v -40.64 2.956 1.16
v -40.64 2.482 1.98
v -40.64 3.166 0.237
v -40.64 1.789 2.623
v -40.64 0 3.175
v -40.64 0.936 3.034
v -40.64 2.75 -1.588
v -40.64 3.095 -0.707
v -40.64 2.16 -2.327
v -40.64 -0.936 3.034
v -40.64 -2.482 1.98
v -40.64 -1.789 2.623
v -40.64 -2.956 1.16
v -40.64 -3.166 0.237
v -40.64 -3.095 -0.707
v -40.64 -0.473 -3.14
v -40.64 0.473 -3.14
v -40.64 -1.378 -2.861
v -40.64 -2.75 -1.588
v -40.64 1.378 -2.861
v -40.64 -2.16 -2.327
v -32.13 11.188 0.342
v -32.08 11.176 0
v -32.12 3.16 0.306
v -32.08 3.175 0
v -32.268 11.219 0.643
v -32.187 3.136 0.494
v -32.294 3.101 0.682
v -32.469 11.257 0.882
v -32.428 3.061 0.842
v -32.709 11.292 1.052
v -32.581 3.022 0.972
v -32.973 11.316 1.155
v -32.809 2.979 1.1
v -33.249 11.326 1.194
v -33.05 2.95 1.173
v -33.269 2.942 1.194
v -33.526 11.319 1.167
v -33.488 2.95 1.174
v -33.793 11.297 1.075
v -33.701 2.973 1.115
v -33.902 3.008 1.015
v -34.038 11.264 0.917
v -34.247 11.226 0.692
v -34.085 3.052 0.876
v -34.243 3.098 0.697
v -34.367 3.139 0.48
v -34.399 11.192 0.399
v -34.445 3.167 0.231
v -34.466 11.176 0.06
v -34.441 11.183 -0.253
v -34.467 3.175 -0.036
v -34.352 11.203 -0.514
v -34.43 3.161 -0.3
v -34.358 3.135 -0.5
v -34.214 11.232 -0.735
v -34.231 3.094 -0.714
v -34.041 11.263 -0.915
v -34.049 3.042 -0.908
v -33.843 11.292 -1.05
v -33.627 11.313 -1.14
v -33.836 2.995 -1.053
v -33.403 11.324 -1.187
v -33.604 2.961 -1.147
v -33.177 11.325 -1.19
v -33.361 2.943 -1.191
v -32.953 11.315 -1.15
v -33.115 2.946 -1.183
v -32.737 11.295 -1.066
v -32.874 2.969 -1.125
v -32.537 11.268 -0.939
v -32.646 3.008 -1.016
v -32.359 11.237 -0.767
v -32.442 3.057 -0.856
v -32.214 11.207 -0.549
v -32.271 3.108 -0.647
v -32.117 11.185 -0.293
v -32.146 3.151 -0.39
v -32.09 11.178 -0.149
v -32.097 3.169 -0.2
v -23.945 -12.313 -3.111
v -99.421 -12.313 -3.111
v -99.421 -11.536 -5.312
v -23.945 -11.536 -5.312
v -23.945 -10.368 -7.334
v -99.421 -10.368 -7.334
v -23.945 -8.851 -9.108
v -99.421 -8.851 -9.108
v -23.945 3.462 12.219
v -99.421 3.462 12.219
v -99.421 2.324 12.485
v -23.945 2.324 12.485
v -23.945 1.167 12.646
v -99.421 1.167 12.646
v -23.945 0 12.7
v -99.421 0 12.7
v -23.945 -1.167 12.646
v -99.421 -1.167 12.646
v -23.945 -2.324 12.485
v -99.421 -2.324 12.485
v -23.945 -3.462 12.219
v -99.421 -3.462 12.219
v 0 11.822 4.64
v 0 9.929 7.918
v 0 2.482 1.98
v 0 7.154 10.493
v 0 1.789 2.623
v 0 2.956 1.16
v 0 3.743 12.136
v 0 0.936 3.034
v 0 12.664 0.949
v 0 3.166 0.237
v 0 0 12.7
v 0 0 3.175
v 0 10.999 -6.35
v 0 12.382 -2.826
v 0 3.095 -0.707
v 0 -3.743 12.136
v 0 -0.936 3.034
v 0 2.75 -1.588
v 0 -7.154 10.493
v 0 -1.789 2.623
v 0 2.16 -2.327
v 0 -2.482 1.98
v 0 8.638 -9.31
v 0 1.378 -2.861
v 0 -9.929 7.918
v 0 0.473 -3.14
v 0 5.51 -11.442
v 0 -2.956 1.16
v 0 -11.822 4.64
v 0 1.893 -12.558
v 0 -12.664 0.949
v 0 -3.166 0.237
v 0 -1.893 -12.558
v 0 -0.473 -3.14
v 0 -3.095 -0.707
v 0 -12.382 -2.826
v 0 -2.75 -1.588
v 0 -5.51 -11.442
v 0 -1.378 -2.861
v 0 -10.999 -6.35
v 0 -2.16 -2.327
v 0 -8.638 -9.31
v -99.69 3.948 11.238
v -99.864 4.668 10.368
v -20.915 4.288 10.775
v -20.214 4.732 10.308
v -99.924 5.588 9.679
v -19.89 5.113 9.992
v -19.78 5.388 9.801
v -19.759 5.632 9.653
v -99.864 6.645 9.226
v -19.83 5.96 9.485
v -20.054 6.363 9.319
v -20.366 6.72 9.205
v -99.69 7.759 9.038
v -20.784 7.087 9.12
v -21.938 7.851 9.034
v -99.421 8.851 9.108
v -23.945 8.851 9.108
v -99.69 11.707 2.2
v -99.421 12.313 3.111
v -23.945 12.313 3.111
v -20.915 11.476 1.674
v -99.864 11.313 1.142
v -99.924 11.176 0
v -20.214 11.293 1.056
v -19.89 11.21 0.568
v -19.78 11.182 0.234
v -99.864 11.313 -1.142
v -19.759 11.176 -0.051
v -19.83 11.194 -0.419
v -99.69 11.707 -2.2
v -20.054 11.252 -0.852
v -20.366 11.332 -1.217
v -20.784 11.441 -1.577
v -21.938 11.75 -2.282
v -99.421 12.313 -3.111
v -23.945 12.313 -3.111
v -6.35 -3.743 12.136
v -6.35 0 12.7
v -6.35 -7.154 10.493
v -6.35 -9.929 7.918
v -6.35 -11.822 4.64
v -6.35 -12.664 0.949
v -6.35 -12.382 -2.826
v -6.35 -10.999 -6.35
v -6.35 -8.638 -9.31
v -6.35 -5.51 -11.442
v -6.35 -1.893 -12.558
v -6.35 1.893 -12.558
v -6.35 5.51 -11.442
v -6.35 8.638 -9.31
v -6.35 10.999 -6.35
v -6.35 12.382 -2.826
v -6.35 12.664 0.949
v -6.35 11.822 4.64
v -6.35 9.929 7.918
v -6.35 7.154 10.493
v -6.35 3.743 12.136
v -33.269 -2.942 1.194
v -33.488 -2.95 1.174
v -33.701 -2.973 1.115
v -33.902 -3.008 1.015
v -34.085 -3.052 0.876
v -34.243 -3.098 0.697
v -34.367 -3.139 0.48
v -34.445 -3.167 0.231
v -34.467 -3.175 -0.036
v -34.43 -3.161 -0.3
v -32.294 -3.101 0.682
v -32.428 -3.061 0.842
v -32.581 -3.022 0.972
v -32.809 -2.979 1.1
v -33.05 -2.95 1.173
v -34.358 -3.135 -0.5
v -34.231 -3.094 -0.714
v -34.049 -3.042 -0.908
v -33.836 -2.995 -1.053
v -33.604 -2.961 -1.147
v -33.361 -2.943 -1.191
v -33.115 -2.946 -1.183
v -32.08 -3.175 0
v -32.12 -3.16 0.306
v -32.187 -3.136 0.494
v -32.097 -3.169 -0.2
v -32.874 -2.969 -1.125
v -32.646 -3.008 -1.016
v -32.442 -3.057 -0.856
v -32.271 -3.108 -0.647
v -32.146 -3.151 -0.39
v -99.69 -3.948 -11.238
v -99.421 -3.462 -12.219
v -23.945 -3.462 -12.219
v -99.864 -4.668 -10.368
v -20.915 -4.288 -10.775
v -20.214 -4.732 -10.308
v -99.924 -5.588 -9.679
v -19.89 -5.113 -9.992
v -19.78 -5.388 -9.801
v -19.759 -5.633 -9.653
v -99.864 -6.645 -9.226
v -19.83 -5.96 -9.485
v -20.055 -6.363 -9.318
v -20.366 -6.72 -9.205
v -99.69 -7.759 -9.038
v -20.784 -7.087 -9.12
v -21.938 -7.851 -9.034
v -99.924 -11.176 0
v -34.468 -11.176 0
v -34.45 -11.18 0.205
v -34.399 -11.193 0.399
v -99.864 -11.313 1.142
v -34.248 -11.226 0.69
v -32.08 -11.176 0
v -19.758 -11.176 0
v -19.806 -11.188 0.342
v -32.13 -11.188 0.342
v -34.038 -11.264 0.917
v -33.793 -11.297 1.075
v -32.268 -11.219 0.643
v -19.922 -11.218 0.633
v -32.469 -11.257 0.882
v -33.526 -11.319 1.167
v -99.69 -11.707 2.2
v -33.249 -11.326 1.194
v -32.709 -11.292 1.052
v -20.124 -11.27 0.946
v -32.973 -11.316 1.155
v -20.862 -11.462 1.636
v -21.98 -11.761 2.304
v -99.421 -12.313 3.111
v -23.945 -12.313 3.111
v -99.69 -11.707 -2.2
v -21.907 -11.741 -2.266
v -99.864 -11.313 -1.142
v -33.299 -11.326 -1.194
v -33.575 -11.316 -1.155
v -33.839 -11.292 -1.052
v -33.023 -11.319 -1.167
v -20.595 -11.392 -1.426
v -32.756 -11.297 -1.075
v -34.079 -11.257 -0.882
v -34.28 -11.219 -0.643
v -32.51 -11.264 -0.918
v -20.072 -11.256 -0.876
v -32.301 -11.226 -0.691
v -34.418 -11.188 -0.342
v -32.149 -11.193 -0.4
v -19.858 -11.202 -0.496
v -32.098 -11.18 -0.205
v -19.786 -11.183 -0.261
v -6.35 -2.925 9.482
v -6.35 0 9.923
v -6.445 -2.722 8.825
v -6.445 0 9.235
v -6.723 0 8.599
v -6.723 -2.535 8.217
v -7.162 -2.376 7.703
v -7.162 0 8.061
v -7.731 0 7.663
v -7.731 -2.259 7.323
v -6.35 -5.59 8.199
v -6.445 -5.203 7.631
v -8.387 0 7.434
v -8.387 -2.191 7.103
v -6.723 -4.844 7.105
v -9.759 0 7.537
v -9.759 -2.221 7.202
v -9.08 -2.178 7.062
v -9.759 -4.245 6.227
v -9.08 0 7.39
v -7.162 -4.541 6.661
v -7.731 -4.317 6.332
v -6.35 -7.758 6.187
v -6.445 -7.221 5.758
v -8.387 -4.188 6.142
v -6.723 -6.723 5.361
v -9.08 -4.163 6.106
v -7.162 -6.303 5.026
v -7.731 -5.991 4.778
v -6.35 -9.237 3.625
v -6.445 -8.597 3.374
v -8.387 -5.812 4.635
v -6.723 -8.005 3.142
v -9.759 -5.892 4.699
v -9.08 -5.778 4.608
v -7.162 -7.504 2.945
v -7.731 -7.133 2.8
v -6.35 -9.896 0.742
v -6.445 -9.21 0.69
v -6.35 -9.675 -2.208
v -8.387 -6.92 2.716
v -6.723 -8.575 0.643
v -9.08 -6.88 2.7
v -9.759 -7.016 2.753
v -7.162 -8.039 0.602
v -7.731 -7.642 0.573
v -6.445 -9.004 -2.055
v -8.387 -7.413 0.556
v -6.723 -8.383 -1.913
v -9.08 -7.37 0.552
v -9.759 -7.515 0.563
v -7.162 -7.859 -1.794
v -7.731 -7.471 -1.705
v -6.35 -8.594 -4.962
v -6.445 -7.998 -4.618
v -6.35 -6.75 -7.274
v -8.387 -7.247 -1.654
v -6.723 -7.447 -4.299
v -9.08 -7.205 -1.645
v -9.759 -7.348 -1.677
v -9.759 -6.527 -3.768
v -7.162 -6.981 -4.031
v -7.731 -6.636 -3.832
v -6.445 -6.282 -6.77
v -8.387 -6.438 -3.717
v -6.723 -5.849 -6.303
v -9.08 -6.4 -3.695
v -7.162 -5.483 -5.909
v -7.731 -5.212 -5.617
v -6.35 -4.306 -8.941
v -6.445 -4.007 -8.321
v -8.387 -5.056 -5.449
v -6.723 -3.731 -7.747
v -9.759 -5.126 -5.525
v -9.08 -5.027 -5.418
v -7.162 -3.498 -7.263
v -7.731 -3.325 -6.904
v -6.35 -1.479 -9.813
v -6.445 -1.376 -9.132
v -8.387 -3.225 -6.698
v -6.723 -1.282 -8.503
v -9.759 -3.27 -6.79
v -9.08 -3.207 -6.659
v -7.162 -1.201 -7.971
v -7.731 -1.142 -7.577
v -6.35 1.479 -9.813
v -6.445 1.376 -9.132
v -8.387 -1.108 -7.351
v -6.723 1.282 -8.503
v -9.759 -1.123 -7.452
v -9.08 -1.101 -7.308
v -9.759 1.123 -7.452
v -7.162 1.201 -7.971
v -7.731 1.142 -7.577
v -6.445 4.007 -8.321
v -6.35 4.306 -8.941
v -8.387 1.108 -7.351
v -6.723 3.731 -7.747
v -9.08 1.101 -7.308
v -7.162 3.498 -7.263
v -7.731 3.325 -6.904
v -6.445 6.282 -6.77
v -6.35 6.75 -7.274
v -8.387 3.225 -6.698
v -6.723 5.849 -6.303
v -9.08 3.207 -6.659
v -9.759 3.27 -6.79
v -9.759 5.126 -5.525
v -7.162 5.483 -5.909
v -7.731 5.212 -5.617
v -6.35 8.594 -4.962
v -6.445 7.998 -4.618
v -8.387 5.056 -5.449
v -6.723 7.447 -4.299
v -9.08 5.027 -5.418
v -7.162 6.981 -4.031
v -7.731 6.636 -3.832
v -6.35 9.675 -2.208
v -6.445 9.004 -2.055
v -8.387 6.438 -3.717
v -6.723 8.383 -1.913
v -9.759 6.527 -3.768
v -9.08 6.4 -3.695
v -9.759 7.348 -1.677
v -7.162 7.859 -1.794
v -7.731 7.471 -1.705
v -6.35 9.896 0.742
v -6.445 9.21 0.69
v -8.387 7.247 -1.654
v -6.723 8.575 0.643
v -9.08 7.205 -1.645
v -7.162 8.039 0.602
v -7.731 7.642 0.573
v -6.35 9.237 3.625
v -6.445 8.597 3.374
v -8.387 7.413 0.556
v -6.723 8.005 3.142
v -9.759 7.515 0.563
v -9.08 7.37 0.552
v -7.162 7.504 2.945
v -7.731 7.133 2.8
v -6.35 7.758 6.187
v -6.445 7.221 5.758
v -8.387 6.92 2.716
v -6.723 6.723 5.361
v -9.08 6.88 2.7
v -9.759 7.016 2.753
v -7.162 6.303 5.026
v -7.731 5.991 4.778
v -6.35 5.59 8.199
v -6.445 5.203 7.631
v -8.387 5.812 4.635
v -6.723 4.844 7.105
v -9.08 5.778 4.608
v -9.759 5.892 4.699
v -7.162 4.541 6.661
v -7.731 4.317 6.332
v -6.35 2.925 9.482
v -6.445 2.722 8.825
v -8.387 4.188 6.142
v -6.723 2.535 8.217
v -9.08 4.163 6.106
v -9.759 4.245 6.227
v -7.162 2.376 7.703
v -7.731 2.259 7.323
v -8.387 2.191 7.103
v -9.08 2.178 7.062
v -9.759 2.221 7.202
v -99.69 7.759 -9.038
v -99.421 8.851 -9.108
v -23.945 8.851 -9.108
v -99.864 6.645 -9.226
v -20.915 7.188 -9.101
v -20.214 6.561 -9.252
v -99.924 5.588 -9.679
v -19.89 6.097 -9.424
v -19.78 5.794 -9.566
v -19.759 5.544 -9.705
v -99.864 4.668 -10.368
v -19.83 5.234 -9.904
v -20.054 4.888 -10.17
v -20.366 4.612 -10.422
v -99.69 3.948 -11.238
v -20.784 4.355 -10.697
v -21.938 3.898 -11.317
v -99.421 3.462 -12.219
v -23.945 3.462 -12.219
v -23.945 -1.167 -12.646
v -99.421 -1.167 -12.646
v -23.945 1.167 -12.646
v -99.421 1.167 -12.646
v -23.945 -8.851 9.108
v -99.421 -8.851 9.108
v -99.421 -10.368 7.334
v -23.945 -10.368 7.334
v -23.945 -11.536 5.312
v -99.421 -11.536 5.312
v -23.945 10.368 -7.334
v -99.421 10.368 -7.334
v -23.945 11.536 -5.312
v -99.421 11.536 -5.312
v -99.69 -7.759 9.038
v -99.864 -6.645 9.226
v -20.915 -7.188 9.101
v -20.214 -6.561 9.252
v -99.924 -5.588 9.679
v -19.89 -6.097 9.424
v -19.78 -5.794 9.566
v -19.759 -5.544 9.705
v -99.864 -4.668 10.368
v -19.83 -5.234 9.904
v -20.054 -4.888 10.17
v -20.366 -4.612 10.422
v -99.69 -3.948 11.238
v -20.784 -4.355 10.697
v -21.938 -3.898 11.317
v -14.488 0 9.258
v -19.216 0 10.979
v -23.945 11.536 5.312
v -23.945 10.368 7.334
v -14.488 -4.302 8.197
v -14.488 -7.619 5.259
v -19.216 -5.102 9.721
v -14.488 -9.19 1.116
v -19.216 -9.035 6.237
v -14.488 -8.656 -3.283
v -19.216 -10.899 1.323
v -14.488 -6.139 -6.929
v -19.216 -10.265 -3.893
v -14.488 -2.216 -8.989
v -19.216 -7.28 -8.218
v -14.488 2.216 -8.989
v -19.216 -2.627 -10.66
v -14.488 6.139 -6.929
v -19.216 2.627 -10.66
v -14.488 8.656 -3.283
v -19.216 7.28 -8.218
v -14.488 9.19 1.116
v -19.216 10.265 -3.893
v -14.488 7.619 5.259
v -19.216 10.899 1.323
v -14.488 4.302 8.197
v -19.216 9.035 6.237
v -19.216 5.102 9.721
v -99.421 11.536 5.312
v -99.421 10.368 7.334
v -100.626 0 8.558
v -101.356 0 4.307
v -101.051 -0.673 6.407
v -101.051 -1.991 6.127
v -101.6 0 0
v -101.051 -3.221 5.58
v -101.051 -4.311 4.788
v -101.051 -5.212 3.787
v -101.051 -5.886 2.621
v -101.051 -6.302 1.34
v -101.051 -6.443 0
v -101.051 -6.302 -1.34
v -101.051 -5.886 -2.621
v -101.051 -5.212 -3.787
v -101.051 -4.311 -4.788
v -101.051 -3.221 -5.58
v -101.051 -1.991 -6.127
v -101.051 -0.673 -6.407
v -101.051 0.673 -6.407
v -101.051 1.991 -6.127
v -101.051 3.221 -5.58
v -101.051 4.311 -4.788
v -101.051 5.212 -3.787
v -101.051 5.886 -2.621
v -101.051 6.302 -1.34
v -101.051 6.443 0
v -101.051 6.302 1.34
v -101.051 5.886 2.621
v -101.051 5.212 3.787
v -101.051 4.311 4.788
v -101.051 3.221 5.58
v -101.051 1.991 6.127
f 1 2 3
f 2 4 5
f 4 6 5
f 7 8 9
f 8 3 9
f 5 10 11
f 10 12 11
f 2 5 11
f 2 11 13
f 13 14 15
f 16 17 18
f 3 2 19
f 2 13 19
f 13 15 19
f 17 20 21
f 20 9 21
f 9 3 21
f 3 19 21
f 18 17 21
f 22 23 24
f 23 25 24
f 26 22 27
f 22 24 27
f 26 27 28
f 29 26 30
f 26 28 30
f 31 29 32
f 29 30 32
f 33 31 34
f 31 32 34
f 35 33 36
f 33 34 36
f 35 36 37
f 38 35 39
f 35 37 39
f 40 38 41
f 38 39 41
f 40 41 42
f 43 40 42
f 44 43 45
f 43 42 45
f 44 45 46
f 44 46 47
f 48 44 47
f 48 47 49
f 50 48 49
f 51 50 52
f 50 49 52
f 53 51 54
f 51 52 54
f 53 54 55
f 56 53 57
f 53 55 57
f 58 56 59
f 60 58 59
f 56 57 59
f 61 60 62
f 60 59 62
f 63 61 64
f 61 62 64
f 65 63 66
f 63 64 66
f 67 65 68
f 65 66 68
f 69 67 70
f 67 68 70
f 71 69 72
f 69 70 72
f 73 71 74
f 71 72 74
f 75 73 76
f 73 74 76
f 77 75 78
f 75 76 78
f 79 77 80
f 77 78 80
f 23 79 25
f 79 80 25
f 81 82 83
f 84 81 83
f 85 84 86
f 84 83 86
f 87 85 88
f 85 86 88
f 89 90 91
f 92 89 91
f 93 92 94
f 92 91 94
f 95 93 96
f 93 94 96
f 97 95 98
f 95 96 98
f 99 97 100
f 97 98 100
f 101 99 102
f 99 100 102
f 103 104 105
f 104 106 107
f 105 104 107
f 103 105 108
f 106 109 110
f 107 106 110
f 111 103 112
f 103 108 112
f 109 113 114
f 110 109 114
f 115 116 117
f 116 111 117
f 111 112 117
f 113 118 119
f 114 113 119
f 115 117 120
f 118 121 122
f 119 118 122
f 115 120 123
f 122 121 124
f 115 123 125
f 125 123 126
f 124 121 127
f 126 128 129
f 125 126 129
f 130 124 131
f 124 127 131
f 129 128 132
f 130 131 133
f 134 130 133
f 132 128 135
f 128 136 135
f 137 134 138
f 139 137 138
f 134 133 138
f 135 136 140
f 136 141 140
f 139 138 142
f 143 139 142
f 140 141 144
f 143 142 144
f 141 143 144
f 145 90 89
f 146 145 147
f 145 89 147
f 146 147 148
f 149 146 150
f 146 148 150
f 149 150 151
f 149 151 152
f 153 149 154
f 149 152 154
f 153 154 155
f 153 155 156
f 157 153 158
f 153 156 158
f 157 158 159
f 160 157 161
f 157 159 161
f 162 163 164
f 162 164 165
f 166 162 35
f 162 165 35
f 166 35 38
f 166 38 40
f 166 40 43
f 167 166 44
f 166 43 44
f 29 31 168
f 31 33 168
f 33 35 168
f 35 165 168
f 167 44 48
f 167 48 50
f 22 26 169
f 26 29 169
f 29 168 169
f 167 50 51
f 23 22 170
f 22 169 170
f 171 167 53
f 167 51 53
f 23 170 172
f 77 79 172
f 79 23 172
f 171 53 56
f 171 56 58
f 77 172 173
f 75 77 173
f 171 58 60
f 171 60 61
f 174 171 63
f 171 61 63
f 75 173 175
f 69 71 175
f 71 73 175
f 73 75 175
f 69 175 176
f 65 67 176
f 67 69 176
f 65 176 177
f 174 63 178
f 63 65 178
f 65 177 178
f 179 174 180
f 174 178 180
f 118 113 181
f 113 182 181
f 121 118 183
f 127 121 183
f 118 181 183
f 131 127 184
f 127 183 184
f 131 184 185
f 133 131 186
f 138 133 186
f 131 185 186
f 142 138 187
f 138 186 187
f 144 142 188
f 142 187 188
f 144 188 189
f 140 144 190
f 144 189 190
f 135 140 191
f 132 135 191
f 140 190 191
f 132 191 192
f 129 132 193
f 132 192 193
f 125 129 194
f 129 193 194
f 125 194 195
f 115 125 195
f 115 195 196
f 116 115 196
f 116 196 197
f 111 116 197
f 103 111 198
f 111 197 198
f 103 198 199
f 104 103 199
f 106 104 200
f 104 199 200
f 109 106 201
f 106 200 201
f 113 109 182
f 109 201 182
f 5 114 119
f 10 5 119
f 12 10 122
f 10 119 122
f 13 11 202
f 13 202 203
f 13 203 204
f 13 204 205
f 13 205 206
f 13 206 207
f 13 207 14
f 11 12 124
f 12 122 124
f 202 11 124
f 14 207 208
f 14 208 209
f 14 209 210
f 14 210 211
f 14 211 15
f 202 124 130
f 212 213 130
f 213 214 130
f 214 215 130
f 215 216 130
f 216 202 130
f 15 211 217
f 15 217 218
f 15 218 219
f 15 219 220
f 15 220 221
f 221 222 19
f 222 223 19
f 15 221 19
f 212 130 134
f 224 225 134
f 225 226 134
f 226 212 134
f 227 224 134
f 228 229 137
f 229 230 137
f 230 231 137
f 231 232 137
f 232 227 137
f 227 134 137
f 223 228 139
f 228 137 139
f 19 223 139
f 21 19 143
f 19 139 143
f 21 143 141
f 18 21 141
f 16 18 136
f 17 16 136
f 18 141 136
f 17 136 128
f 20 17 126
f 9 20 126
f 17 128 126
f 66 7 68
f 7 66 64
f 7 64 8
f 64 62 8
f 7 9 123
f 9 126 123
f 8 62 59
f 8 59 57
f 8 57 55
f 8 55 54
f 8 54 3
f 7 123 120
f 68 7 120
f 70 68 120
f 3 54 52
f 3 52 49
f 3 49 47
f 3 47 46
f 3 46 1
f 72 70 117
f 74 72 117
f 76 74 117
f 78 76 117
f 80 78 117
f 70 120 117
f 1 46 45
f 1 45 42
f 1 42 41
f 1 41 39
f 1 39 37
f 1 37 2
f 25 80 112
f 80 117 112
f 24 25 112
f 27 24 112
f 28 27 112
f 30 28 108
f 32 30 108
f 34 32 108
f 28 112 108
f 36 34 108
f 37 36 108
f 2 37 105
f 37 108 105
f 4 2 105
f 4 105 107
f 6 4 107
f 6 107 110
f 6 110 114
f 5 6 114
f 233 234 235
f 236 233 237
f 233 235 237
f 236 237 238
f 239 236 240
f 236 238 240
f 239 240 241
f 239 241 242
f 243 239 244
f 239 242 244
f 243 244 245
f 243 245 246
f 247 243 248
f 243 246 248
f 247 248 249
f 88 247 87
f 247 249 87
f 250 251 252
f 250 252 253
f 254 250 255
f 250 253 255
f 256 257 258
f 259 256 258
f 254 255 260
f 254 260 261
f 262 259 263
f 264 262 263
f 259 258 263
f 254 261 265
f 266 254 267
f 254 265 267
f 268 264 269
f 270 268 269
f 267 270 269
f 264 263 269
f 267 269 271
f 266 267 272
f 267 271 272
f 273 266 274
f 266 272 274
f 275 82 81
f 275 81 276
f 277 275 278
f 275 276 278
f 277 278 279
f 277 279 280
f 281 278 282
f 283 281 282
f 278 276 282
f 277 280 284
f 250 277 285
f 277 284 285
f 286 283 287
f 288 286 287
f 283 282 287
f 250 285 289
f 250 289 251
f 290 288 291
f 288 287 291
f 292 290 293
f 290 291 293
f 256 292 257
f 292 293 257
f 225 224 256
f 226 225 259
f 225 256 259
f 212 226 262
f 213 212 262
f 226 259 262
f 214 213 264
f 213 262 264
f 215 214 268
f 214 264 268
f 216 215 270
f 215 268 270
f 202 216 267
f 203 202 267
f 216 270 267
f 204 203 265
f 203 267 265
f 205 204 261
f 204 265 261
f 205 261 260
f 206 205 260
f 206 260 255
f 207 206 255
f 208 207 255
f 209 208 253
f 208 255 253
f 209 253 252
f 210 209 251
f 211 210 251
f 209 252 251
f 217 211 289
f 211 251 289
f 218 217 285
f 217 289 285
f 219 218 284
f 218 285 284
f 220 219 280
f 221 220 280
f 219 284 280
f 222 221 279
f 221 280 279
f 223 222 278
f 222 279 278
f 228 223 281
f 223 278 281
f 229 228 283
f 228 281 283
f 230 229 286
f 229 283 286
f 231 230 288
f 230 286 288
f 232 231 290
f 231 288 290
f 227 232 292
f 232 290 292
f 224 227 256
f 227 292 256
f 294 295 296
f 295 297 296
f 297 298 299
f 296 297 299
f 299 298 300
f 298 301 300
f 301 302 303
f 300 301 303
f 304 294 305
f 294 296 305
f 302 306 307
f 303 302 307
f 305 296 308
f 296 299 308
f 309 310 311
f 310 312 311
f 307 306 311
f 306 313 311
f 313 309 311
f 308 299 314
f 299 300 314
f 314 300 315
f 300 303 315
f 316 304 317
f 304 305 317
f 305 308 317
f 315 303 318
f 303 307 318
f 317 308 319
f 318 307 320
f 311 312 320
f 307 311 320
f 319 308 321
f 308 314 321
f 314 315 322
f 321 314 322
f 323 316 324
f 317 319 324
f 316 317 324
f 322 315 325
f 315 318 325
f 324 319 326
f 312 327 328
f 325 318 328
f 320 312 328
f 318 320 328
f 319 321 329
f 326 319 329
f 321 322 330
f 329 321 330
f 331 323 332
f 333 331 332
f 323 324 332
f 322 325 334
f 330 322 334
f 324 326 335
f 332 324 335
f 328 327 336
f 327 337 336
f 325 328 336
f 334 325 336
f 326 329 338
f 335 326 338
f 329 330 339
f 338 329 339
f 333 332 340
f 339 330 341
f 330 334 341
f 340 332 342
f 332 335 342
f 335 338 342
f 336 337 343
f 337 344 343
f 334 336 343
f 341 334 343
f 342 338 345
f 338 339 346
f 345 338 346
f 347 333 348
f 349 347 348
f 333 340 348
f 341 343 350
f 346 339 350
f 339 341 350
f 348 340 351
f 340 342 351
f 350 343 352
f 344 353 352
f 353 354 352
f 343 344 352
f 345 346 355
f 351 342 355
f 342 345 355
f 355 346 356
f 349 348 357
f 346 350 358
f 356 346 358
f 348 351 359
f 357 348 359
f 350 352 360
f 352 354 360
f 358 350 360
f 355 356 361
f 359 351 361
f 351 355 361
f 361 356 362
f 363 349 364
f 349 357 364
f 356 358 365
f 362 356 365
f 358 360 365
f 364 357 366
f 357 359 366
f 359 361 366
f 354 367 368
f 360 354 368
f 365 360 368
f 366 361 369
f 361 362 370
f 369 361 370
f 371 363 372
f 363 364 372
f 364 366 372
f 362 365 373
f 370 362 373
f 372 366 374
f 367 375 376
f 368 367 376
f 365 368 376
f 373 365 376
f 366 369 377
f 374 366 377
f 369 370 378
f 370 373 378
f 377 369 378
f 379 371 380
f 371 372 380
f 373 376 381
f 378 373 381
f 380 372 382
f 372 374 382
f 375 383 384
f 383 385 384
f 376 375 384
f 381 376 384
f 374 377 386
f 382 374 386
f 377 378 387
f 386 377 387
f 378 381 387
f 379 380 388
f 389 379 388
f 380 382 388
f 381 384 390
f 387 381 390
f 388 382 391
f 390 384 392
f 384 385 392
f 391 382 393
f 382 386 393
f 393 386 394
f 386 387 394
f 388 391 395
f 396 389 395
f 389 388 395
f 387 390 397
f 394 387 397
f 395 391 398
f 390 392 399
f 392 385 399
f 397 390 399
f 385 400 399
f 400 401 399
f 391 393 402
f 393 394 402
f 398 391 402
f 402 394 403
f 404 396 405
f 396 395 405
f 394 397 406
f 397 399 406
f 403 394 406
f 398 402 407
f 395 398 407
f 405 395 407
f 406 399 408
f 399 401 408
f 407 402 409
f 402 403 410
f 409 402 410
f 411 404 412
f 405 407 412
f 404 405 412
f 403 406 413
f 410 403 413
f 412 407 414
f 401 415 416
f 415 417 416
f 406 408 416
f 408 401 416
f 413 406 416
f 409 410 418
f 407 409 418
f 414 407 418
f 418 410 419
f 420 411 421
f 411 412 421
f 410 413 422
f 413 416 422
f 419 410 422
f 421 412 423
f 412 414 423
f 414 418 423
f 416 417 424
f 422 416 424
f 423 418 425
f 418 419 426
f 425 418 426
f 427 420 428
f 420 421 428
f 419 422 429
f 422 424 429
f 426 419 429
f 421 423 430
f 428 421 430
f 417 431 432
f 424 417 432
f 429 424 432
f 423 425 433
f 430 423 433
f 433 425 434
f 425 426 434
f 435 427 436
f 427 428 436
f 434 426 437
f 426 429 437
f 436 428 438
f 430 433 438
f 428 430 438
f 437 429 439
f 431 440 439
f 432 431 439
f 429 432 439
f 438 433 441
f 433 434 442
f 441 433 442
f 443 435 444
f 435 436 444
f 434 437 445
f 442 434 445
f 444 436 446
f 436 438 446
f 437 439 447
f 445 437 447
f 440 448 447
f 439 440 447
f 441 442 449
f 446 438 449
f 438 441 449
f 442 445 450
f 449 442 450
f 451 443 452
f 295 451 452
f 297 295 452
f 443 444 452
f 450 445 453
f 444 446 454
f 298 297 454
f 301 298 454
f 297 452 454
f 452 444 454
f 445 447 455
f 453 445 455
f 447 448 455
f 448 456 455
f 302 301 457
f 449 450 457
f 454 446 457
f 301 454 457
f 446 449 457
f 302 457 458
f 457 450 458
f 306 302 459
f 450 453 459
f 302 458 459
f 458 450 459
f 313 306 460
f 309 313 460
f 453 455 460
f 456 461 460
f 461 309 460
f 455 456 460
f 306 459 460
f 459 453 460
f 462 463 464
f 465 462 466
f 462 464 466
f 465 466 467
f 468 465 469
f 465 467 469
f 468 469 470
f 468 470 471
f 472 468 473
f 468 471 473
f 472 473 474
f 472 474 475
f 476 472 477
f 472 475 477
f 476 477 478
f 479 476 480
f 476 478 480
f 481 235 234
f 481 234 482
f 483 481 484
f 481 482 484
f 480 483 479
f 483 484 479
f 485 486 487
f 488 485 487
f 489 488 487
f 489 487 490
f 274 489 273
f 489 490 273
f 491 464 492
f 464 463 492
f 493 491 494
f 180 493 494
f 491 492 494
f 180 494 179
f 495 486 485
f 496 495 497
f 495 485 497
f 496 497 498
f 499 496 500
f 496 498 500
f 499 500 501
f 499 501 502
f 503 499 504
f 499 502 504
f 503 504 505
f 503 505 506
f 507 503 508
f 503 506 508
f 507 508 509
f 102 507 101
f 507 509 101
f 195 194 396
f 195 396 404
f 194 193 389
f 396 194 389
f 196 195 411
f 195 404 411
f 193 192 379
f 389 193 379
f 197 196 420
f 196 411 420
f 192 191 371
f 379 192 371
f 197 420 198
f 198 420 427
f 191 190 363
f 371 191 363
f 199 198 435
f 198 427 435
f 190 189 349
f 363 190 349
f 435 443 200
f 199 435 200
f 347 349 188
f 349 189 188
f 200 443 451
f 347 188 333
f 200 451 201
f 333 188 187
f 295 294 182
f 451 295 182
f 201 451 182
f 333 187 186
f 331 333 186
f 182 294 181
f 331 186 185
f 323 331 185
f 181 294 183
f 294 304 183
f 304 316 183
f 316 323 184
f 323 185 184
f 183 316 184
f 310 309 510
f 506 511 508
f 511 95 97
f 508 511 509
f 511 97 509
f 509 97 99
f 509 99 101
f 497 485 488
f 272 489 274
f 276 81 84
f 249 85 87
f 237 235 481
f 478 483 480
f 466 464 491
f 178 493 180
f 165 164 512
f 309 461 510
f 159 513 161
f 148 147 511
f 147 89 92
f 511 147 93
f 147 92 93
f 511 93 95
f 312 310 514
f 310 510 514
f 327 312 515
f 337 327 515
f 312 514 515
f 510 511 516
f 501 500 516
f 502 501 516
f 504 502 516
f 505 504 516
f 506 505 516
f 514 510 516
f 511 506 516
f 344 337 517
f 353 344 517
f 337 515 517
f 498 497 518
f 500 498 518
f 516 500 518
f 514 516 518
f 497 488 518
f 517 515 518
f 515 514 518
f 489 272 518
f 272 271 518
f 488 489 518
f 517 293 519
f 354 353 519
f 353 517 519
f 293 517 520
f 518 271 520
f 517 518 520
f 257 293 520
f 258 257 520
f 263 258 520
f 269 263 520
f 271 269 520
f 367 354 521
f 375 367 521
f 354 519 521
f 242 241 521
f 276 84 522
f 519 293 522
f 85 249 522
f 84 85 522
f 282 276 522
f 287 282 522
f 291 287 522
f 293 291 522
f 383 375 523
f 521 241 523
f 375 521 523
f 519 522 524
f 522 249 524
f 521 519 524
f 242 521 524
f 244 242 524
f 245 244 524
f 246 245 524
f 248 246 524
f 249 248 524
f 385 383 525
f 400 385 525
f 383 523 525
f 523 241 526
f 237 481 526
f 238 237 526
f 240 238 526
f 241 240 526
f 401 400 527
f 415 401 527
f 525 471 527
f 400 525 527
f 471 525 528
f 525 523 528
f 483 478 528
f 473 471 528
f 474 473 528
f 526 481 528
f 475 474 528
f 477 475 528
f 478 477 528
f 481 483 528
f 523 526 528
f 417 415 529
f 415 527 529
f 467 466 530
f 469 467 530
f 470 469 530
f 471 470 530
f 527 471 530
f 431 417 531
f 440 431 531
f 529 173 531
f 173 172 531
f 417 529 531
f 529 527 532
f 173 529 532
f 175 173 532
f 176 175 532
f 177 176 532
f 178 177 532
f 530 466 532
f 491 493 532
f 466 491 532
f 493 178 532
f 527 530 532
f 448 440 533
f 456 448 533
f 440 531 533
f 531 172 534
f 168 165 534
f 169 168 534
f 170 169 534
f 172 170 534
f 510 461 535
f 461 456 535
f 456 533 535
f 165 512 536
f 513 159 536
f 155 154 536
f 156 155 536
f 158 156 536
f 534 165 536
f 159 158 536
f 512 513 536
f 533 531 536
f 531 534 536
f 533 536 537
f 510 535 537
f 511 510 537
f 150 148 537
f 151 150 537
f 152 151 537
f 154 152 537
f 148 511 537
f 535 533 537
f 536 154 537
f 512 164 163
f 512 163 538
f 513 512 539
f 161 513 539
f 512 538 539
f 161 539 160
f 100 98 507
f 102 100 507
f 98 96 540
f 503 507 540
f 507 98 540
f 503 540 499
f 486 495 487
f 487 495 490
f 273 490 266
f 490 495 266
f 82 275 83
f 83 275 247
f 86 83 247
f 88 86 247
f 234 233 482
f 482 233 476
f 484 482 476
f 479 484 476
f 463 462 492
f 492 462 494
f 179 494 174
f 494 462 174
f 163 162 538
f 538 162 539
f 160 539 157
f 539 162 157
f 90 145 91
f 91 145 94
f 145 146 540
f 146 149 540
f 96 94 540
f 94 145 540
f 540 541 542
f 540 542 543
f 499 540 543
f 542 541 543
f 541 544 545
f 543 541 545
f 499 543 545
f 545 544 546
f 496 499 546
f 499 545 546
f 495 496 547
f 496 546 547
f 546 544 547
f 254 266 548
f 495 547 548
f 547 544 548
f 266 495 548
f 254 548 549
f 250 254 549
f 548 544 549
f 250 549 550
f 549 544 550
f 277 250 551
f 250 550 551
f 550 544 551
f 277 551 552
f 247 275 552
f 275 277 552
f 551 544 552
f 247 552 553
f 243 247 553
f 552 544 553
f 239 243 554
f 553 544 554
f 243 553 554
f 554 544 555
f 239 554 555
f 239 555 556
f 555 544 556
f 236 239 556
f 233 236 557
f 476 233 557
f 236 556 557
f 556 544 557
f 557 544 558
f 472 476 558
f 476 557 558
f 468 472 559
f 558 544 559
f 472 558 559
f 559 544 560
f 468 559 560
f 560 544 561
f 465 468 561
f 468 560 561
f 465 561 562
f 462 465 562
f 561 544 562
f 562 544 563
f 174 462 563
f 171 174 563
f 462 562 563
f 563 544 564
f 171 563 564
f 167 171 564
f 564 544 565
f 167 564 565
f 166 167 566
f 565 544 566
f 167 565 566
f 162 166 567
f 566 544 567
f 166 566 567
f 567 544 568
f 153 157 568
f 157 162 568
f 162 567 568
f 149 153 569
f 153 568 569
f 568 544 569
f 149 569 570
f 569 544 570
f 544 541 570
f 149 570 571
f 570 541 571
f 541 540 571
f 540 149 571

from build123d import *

# Parameters (mm, degrees)
F3_START = -7.62
F3_DEPTH = 93.981
F4_R     = 1.1938
F5_DEPTH = 12.7


with BuildPart() as f1:
    # F0 (on Front) → F1 (revolve)
    with BuildSketch(Plane.XZ):
        with BuildLine():
            Line((-101.6, 0), (-40.64, 0))
            Line((-40.64, 0), (-40.64, 3.175))
            Line((-40.64, 3.175), (0, 3.175))
            Line((0, 3.175), (0, 12.7))
            Line((0, 12.7), (-6.35, 12.7))
            Line((-6.35, 12.7), (-6.35, 9.9233625935))
            ThreePointArc((-6.35, 9.9233625935), (-7.4331158517, 7.842716401), (-9.758731164, 7.5365433367))
            Line((-9.758731164, 7.5365433367), (-23.9452117528, 12.7))
            Line((-23.9452117528, 12.7), (-99.4210244843, 12.7))
            ThreePointArc((-99.4210244843, 12.7), (-101.0513051228, 6.4427853895), (-101.6, 0))
        make_face()
    revolve(axis=Axis((-71.12, 0, 0), (1, 0, 0)))

    # F2 (on Right) → F3 (cut)
    with BuildSketch(Plane.YZ.offset(F3_START)):
        with BuildLine():
            ThreePointArc((-3.175, 13.8581385114), (-3.2583413998, 14.751147695), (-3.5054871123, 15.6133136811))
            ThreePointArc((-3.5054871123, 15.6133136811), (-8.001, 13.8581385114), (-11.768782729, 10.8424977325))
            ThreePointArc((-11.768782729, 10.8424977325), (-6.4030393387, 9.3043710903), (-3.175, 13.8581385114))
        make_face()
        with BuildLine():
            ThreePointArc((3.5054871123, 15.6133136811), (5.588, 9.6786999127), (11.768782729, 10.8424977325))
            ThreePointArc((11.768782729, 10.8424977325), (8.001, 13.8581385114), (3.5054871123, 15.6133136811))
        make_face()
        with BuildLine():
            ThreePointArc((15.2742698413, -4.7708159487), (15.8190213035, -2.413), (16.002, 0))
            ThreePointArc((16.002, 0), (15.8190213035, 2.413), (15.2742698413, 4.7708159487))
            ThreePointArc((15.2742698413, 4.7708159487), (11.176, 0), (15.2742698413, -4.7708159487))
        make_face()
        with BuildLine():
            ThreePointArc((3.5054871123, -15.6133136811), (8.001, -13.8581385114), (11.768782729, -10.8424977325))
            ThreePointArc((11.768782729, -10.8424977325), (5.588, -9.6786999127), (3.5054871123, -15.6133136811))
        make_face()
        with BuildLine():
            ThreePointArc((-11.768782729, -10.8424977325), (-8.001, -13.8581385114), (-3.5054871123, -15.6133136811))
            ThreePointArc((-3.5054871123, -15.6133136811), (-3.2583413998, -14.751147695), (-3.175, -13.8581385114))
            ThreePointArc((-3.175, -13.8581385114), (-6.4030393387, -9.3043710903), (-11.768782729, -10.8424977325))
        make_face()
        with BuildLine():
            ThreePointArc((-11.176, 0), (-12.3412417626, 3.1446979389), (-15.2742698413, 4.7708159487))
            ThreePointArc((-15.2742698413, 4.7708159487), (-16.002, 0), (-15.2742698413, -4.7708159487))
            ThreePointArc((-15.2742698413, -4.7708159487), (-12.3412417626, -3.1446979389), (-11.176, 0))
        make_face()
    extrude(amount=-F3_DEPTH, mode=Mode.SUBTRACT)

    # F4 (on Front) → F5 (cut, symmetric)
    with BuildSketch(Plane.XZ):
        with Locations((-33.274, 0)):
            Circle(F4_R)
    extrude(amount=F5_DEPTH, both=True, mode=Mode.SUBTRACT)


solid = f1.part
